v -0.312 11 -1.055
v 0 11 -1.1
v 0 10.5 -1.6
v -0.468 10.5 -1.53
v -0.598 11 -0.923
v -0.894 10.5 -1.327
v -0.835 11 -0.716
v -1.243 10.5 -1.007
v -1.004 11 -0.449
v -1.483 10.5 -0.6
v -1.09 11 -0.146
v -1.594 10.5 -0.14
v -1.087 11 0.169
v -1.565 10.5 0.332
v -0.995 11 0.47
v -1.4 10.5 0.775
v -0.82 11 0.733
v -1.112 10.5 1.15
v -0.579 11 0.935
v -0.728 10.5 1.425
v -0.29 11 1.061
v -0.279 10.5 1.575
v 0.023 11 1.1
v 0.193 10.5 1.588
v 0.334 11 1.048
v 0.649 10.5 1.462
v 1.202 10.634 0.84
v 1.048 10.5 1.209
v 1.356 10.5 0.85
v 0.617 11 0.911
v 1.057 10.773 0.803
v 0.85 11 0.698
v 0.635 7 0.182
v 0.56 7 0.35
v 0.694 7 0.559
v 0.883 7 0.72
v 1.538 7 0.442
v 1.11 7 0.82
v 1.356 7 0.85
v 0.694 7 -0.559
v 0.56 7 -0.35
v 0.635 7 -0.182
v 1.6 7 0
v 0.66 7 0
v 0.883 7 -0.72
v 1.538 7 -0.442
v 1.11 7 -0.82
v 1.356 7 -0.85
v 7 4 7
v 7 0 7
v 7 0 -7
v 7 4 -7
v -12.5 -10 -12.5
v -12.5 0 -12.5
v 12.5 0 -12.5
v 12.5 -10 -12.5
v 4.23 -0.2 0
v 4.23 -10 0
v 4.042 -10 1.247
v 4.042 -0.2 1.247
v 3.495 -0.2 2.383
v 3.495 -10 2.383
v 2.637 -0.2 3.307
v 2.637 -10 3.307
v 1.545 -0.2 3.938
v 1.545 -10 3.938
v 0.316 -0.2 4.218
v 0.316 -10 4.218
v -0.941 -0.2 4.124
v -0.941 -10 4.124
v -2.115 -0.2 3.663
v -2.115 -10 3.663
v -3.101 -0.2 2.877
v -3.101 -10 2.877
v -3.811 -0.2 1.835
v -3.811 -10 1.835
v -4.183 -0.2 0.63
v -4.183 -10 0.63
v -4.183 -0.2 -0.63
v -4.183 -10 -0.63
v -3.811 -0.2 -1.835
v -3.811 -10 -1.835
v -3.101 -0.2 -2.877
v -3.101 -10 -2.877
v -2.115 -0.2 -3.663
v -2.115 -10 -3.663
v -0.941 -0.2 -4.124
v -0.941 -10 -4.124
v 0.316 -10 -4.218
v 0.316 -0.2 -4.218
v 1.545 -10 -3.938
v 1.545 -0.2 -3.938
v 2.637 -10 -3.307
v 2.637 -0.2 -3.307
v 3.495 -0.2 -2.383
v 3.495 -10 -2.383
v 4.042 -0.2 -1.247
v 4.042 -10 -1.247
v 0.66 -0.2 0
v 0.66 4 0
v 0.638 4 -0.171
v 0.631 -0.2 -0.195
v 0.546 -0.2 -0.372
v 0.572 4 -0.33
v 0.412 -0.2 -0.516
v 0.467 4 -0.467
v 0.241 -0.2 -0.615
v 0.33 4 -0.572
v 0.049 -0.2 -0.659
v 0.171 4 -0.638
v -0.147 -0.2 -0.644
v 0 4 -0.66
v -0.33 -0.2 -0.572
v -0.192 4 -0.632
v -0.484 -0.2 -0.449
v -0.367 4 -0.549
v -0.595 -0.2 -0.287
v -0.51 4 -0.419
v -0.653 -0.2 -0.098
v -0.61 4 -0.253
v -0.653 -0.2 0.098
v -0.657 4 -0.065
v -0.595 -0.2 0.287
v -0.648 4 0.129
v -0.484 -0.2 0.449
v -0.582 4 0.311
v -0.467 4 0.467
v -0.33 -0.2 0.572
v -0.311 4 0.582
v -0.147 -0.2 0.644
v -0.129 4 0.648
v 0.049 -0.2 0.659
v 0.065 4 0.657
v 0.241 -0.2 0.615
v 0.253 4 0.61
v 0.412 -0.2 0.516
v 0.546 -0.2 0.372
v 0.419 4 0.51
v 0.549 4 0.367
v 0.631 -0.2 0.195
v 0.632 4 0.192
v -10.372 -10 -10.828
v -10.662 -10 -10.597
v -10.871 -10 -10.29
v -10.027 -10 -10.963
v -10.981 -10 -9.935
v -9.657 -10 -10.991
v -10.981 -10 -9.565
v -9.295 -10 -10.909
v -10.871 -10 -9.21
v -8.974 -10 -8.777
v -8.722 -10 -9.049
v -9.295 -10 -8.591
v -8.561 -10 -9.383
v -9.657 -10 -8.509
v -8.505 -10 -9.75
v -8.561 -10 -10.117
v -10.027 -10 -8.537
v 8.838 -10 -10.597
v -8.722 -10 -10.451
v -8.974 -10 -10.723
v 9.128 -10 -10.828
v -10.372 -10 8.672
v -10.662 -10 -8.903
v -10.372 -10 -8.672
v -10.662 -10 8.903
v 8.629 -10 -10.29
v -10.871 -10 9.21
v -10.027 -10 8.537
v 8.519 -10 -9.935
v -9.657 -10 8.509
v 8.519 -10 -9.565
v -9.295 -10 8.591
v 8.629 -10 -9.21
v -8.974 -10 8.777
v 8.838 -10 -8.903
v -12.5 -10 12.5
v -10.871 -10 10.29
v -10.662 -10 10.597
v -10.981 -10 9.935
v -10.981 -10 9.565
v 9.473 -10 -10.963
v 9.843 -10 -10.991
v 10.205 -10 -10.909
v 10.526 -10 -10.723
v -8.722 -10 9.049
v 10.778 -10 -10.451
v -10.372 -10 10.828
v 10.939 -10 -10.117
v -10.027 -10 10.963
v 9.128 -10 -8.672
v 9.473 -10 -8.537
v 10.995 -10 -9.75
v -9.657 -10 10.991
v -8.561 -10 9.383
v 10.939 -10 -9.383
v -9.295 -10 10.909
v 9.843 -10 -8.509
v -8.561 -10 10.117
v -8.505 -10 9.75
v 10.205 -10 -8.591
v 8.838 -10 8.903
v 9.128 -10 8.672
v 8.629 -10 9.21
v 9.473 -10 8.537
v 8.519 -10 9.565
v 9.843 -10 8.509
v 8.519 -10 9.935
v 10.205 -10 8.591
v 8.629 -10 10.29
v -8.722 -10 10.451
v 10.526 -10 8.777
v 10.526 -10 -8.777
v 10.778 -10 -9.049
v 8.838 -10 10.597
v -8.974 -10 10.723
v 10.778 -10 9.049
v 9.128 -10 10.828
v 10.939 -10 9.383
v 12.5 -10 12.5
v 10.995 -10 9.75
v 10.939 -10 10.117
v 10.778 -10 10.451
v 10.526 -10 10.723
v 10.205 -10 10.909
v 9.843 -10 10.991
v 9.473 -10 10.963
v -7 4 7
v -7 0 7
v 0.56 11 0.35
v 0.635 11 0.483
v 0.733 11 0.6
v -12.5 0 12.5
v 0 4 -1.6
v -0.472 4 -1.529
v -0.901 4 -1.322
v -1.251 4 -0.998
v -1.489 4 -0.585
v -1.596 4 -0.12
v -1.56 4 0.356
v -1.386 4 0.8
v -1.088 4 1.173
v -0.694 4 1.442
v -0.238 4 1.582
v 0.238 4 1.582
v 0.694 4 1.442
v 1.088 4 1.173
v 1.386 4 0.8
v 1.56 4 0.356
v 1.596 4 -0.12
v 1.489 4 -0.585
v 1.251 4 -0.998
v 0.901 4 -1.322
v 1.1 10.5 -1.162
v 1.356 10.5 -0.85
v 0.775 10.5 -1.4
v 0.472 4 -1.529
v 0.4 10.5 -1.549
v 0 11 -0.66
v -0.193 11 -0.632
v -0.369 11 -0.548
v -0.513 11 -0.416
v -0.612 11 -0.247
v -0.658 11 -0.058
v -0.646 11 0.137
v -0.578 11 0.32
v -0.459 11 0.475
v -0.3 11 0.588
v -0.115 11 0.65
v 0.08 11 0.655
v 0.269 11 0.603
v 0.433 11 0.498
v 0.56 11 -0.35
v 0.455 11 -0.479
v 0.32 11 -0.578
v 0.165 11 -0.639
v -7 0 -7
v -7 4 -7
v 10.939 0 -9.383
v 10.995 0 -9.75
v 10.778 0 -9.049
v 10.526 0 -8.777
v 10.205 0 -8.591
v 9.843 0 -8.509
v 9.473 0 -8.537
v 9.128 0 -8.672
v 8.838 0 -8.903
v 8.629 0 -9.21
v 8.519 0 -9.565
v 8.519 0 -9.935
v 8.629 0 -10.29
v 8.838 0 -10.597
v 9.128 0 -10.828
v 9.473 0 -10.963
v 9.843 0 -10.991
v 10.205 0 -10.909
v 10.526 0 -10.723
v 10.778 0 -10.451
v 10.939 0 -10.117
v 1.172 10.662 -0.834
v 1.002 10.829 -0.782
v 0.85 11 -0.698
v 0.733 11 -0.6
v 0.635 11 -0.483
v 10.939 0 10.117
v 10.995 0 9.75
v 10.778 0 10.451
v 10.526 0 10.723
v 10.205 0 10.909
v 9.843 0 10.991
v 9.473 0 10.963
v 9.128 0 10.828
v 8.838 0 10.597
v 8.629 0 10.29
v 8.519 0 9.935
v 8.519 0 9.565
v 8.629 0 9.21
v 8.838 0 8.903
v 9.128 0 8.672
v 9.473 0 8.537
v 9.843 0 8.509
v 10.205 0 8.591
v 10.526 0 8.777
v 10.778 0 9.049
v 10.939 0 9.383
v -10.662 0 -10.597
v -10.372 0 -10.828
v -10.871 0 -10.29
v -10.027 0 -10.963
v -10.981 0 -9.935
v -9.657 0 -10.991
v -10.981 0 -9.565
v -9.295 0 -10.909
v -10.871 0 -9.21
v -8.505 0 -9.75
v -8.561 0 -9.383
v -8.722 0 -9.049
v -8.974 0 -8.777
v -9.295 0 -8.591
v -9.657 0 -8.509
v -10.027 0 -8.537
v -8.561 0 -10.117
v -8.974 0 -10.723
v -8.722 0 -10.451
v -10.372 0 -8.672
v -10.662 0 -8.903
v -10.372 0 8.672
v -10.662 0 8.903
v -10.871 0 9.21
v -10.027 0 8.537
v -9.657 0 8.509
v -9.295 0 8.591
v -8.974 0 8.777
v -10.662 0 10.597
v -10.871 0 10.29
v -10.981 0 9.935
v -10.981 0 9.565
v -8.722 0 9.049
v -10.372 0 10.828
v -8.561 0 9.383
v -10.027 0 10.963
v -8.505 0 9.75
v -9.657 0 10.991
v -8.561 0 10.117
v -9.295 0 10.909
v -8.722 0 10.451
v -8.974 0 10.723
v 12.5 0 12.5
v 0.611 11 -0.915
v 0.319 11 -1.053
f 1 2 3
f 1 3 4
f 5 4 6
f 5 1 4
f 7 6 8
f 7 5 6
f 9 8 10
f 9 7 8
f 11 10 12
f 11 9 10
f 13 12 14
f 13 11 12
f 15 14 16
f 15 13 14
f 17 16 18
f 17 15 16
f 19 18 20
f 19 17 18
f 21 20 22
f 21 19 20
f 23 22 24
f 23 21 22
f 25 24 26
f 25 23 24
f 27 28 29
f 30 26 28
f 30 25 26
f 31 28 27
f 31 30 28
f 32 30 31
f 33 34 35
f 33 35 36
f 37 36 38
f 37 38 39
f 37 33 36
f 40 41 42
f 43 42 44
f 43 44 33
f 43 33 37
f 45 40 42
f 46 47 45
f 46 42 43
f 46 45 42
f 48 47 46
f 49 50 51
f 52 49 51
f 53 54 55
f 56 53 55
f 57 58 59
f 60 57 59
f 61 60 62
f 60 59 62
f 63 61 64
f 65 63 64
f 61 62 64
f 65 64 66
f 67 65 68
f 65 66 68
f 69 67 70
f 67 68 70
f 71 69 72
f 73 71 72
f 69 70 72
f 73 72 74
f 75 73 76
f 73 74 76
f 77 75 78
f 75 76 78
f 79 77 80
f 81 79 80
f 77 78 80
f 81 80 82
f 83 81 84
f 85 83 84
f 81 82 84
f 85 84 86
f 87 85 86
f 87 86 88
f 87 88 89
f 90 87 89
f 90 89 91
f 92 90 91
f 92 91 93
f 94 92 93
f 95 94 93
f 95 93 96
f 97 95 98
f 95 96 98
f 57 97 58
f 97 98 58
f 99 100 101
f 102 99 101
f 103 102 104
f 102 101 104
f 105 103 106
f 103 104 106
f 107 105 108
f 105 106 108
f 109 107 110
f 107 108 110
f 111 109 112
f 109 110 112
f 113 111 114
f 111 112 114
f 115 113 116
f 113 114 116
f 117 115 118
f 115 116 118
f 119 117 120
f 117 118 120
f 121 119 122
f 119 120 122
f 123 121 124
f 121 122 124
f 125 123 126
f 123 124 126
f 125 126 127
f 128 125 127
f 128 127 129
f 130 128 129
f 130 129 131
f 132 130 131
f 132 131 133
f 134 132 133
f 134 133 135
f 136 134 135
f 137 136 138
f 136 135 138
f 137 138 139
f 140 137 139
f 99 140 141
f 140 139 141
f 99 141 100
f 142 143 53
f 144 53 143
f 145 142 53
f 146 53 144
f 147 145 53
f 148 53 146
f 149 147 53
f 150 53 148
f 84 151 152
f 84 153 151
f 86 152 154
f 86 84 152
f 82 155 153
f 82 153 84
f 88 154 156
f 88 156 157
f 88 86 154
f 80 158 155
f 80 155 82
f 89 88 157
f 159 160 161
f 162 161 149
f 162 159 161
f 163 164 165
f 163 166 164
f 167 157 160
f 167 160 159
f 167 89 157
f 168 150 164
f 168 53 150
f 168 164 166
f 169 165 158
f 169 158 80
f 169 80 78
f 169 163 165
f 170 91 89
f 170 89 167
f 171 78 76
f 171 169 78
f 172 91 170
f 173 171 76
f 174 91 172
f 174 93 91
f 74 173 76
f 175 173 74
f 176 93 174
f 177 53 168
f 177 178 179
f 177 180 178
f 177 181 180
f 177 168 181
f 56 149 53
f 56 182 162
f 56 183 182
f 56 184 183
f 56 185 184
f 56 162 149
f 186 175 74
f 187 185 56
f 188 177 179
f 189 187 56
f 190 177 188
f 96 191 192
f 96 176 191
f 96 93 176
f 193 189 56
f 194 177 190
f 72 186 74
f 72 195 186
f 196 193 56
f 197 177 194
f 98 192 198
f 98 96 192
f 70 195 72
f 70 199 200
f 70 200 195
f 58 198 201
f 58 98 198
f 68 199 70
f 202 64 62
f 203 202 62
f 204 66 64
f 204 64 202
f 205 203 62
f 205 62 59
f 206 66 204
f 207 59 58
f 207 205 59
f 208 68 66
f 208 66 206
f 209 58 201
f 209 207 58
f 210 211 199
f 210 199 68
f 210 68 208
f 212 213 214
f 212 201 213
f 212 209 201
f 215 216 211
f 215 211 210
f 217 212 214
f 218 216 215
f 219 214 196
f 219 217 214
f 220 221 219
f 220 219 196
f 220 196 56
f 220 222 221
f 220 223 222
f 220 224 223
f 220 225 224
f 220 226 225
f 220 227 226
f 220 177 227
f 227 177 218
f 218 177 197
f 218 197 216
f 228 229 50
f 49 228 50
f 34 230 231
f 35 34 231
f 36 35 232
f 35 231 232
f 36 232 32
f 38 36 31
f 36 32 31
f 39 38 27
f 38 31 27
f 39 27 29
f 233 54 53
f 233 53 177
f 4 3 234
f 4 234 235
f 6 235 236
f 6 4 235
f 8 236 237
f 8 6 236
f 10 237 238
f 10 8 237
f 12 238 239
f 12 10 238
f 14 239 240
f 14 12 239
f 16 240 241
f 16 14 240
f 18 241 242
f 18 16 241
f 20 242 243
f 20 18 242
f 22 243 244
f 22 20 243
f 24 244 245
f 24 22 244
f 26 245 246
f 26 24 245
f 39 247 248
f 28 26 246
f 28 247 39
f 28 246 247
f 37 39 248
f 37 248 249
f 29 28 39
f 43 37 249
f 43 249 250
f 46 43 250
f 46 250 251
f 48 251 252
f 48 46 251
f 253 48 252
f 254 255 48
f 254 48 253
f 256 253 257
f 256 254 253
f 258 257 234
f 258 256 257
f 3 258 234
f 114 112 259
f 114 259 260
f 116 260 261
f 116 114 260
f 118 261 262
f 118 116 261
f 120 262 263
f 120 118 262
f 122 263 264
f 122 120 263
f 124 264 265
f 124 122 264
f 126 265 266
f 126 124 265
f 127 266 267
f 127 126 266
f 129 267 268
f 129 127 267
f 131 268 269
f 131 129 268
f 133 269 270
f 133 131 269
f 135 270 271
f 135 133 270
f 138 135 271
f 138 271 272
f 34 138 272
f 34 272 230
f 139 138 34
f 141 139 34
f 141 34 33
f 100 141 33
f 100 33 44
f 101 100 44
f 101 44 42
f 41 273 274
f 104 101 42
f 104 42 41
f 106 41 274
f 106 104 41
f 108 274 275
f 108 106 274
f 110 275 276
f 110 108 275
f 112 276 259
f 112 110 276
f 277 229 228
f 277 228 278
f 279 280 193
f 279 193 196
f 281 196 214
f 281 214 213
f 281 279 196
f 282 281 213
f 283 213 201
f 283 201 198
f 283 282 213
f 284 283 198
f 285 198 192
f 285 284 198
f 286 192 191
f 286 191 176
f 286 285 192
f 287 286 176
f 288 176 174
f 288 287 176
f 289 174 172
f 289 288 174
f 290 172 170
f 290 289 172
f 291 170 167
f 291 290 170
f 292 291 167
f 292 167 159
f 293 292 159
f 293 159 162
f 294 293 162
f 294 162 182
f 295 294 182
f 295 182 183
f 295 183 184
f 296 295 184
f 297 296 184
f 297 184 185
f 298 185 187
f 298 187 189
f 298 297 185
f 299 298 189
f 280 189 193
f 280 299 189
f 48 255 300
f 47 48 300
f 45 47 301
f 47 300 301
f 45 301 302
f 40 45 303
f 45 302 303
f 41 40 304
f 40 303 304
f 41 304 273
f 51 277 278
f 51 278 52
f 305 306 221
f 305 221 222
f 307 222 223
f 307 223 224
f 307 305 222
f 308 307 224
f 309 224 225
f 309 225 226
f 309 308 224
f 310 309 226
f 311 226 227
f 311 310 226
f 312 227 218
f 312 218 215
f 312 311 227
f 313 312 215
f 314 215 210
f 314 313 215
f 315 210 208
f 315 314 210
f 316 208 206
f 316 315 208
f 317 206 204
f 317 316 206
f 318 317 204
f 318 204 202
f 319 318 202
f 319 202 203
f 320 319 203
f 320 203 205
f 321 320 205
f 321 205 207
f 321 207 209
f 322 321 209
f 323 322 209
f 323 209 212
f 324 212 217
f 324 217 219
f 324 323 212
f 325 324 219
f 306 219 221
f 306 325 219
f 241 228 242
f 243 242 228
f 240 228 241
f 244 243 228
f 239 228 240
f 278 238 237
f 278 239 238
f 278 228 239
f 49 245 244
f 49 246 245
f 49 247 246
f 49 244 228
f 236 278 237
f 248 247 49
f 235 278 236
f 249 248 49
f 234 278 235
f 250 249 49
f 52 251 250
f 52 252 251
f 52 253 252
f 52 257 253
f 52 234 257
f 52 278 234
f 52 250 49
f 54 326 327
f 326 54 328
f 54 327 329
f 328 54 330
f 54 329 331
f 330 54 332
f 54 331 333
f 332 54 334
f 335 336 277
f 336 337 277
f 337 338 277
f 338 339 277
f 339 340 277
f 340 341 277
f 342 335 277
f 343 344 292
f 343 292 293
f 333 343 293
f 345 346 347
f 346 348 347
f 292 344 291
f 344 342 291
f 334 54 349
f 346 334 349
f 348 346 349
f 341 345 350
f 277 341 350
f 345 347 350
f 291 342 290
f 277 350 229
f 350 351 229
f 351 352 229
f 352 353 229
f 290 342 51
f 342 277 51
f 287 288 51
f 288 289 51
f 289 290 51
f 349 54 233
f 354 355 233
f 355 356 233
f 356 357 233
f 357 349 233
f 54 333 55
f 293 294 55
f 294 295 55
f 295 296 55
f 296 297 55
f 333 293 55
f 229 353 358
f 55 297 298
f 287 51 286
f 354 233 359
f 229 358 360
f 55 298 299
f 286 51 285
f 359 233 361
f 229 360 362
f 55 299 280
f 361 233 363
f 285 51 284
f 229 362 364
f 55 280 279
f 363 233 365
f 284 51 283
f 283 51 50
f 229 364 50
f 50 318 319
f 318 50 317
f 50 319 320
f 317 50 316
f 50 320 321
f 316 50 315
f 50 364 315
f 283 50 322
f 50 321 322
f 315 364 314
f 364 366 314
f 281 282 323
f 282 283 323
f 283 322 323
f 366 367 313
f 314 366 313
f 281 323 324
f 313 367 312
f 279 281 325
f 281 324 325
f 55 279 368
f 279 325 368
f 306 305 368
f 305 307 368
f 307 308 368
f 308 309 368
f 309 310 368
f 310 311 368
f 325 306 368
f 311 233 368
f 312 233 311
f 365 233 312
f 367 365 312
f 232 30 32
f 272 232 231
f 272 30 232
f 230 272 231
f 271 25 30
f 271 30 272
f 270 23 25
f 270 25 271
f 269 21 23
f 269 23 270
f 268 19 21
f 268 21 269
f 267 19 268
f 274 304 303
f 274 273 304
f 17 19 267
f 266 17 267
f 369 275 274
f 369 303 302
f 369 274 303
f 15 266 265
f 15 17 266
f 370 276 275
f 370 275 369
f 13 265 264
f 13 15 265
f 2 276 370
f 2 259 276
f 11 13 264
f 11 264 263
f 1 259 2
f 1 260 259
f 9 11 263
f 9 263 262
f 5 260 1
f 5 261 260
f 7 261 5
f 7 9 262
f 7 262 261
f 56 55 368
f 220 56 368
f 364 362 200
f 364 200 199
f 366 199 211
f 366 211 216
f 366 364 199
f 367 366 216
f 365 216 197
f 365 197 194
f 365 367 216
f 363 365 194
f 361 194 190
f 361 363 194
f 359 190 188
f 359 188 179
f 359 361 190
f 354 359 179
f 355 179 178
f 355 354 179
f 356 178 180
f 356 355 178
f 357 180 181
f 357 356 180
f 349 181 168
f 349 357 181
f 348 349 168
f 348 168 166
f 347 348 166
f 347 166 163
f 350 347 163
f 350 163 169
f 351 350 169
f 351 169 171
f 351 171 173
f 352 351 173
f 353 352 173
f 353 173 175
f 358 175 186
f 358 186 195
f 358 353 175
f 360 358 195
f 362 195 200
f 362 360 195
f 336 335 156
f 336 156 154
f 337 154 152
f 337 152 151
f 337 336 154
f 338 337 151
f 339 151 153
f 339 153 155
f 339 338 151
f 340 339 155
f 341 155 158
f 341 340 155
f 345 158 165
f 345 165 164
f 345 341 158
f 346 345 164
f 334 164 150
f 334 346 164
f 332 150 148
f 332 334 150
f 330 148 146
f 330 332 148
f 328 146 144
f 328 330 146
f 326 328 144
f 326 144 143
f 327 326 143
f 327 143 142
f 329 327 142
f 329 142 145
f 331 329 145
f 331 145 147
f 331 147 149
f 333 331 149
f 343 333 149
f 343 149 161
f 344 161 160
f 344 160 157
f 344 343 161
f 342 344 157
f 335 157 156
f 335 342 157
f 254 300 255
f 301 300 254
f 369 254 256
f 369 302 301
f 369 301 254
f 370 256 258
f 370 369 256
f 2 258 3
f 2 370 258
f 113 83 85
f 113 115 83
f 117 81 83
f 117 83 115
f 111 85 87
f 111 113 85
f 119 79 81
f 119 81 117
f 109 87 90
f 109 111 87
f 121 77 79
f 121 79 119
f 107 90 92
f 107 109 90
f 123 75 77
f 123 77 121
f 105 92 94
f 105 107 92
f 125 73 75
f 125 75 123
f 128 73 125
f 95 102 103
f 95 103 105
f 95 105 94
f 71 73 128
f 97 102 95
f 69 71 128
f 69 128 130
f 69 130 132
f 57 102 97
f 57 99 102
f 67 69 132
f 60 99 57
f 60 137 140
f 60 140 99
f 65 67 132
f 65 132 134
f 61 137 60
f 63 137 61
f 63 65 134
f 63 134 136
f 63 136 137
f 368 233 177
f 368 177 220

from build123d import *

# Parameters (mm, degrees)
SKETCH1_W           = 14
SKETCH1_H           = 14
BOSS_EXTRUDE1_DEPTH = 4
SKETCH2_W           = 25
SKETCH2_H           = 25
SKETCH2_R           = 1.2446
BOSS_EXTRUDE2_DEPTH = 10
SKETCH3_R           = 4.23
CUT_EXTRUDE1_DEPTH  = 9.8
SKETCH5_R           = 0.6604
CUT_EXTRUDE2_DEPTH  = 14
SKETCH8_R           = 0.85
CUT_EXTRUDE3_DEPTH  = 4


with BuildPart() as part:
    # Sketch1 → Boss-Extrude1 (new body)
    with BuildSketch(Plane(origin=(0, 0, 0), x_dir=(1, 0, 0), z_dir=(0, 1, 0))):
        Rectangle(SKETCH1_W, SKETCH1_H)
    extrude(amount=BOSS_EXTRUDE1_DEPTH)

    # Sketch2 → Boss-Extrude2 (add)
    with BuildSketch(Plane.XZ):
        Rectangle(SKETCH2_W, SKETCH2_H)
        with Locations((-9.75, 9.75)):
            Circle(SKETCH2_R, mode=Mode.SUBTRACT)
        with Locations((9.75, 9.75)):
            Circle(SKETCH2_R, mode=Mode.SUBTRACT)
        with Locations((9.75, -9.75)):
            Circle(SKETCH2_R, mode=Mode.SUBTRACT)
        with Locations((-9.75, -9.75)):
            Circle(SKETCH2_R, mode=Mode.SUBTRACT)
    extrude(amount=BOSS_EXTRUDE2_DEPTH)

    # Sketch3 → Cut-Extrude1 (cut)
    with BuildSketch(Plane.XZ.offset(10)):
        Circle(SKETCH3_R)
    extrude(amount=-CUT_EXTRUDE1_DEPTH, mode=Mode.SUBTRACT)

    # Sketch4 → Revolve1 (revolve)
    with BuildSketch(Plane(origin=(0, 0, 0), x_dir=(0, 0, -1), z_dir=(1, 0, 0))):
        Polygon((0.6604, 11), (0.6604, 4), (1.6, 4), (1.6, 10.5), (1.1, 11), align=None)
    revolve(axis=Axis((0, 4, 0), (0, 1, 0)))

    # Sketch5 → Cut-Extrude2 (cut)
    with BuildSketch(Plane(origin=(0, 4, 0), x_dir=(1, 0, 0), z_dir=(0, 1, 0))):
        Circle(SKETCH5_R)
    extrude(amount=-CUT_EXTRUDE2_DEPTH, mode=Mode.SUBTRACT)

    # Sketch8 → Cut-Extrude3 (cut)
    with BuildSketch(Plane(origin=(0, 11, 0), x_dir=(1, 0, 0), z_dir=(0, 1, 0))):
        with Locations((1.334621812, 0)):
            Circle(SKETCH8_R)
    extrude(amount=-CUT_EXTRUDE3_DEPTH, mode=Mode.SUBTRACT)


solid = part.part
